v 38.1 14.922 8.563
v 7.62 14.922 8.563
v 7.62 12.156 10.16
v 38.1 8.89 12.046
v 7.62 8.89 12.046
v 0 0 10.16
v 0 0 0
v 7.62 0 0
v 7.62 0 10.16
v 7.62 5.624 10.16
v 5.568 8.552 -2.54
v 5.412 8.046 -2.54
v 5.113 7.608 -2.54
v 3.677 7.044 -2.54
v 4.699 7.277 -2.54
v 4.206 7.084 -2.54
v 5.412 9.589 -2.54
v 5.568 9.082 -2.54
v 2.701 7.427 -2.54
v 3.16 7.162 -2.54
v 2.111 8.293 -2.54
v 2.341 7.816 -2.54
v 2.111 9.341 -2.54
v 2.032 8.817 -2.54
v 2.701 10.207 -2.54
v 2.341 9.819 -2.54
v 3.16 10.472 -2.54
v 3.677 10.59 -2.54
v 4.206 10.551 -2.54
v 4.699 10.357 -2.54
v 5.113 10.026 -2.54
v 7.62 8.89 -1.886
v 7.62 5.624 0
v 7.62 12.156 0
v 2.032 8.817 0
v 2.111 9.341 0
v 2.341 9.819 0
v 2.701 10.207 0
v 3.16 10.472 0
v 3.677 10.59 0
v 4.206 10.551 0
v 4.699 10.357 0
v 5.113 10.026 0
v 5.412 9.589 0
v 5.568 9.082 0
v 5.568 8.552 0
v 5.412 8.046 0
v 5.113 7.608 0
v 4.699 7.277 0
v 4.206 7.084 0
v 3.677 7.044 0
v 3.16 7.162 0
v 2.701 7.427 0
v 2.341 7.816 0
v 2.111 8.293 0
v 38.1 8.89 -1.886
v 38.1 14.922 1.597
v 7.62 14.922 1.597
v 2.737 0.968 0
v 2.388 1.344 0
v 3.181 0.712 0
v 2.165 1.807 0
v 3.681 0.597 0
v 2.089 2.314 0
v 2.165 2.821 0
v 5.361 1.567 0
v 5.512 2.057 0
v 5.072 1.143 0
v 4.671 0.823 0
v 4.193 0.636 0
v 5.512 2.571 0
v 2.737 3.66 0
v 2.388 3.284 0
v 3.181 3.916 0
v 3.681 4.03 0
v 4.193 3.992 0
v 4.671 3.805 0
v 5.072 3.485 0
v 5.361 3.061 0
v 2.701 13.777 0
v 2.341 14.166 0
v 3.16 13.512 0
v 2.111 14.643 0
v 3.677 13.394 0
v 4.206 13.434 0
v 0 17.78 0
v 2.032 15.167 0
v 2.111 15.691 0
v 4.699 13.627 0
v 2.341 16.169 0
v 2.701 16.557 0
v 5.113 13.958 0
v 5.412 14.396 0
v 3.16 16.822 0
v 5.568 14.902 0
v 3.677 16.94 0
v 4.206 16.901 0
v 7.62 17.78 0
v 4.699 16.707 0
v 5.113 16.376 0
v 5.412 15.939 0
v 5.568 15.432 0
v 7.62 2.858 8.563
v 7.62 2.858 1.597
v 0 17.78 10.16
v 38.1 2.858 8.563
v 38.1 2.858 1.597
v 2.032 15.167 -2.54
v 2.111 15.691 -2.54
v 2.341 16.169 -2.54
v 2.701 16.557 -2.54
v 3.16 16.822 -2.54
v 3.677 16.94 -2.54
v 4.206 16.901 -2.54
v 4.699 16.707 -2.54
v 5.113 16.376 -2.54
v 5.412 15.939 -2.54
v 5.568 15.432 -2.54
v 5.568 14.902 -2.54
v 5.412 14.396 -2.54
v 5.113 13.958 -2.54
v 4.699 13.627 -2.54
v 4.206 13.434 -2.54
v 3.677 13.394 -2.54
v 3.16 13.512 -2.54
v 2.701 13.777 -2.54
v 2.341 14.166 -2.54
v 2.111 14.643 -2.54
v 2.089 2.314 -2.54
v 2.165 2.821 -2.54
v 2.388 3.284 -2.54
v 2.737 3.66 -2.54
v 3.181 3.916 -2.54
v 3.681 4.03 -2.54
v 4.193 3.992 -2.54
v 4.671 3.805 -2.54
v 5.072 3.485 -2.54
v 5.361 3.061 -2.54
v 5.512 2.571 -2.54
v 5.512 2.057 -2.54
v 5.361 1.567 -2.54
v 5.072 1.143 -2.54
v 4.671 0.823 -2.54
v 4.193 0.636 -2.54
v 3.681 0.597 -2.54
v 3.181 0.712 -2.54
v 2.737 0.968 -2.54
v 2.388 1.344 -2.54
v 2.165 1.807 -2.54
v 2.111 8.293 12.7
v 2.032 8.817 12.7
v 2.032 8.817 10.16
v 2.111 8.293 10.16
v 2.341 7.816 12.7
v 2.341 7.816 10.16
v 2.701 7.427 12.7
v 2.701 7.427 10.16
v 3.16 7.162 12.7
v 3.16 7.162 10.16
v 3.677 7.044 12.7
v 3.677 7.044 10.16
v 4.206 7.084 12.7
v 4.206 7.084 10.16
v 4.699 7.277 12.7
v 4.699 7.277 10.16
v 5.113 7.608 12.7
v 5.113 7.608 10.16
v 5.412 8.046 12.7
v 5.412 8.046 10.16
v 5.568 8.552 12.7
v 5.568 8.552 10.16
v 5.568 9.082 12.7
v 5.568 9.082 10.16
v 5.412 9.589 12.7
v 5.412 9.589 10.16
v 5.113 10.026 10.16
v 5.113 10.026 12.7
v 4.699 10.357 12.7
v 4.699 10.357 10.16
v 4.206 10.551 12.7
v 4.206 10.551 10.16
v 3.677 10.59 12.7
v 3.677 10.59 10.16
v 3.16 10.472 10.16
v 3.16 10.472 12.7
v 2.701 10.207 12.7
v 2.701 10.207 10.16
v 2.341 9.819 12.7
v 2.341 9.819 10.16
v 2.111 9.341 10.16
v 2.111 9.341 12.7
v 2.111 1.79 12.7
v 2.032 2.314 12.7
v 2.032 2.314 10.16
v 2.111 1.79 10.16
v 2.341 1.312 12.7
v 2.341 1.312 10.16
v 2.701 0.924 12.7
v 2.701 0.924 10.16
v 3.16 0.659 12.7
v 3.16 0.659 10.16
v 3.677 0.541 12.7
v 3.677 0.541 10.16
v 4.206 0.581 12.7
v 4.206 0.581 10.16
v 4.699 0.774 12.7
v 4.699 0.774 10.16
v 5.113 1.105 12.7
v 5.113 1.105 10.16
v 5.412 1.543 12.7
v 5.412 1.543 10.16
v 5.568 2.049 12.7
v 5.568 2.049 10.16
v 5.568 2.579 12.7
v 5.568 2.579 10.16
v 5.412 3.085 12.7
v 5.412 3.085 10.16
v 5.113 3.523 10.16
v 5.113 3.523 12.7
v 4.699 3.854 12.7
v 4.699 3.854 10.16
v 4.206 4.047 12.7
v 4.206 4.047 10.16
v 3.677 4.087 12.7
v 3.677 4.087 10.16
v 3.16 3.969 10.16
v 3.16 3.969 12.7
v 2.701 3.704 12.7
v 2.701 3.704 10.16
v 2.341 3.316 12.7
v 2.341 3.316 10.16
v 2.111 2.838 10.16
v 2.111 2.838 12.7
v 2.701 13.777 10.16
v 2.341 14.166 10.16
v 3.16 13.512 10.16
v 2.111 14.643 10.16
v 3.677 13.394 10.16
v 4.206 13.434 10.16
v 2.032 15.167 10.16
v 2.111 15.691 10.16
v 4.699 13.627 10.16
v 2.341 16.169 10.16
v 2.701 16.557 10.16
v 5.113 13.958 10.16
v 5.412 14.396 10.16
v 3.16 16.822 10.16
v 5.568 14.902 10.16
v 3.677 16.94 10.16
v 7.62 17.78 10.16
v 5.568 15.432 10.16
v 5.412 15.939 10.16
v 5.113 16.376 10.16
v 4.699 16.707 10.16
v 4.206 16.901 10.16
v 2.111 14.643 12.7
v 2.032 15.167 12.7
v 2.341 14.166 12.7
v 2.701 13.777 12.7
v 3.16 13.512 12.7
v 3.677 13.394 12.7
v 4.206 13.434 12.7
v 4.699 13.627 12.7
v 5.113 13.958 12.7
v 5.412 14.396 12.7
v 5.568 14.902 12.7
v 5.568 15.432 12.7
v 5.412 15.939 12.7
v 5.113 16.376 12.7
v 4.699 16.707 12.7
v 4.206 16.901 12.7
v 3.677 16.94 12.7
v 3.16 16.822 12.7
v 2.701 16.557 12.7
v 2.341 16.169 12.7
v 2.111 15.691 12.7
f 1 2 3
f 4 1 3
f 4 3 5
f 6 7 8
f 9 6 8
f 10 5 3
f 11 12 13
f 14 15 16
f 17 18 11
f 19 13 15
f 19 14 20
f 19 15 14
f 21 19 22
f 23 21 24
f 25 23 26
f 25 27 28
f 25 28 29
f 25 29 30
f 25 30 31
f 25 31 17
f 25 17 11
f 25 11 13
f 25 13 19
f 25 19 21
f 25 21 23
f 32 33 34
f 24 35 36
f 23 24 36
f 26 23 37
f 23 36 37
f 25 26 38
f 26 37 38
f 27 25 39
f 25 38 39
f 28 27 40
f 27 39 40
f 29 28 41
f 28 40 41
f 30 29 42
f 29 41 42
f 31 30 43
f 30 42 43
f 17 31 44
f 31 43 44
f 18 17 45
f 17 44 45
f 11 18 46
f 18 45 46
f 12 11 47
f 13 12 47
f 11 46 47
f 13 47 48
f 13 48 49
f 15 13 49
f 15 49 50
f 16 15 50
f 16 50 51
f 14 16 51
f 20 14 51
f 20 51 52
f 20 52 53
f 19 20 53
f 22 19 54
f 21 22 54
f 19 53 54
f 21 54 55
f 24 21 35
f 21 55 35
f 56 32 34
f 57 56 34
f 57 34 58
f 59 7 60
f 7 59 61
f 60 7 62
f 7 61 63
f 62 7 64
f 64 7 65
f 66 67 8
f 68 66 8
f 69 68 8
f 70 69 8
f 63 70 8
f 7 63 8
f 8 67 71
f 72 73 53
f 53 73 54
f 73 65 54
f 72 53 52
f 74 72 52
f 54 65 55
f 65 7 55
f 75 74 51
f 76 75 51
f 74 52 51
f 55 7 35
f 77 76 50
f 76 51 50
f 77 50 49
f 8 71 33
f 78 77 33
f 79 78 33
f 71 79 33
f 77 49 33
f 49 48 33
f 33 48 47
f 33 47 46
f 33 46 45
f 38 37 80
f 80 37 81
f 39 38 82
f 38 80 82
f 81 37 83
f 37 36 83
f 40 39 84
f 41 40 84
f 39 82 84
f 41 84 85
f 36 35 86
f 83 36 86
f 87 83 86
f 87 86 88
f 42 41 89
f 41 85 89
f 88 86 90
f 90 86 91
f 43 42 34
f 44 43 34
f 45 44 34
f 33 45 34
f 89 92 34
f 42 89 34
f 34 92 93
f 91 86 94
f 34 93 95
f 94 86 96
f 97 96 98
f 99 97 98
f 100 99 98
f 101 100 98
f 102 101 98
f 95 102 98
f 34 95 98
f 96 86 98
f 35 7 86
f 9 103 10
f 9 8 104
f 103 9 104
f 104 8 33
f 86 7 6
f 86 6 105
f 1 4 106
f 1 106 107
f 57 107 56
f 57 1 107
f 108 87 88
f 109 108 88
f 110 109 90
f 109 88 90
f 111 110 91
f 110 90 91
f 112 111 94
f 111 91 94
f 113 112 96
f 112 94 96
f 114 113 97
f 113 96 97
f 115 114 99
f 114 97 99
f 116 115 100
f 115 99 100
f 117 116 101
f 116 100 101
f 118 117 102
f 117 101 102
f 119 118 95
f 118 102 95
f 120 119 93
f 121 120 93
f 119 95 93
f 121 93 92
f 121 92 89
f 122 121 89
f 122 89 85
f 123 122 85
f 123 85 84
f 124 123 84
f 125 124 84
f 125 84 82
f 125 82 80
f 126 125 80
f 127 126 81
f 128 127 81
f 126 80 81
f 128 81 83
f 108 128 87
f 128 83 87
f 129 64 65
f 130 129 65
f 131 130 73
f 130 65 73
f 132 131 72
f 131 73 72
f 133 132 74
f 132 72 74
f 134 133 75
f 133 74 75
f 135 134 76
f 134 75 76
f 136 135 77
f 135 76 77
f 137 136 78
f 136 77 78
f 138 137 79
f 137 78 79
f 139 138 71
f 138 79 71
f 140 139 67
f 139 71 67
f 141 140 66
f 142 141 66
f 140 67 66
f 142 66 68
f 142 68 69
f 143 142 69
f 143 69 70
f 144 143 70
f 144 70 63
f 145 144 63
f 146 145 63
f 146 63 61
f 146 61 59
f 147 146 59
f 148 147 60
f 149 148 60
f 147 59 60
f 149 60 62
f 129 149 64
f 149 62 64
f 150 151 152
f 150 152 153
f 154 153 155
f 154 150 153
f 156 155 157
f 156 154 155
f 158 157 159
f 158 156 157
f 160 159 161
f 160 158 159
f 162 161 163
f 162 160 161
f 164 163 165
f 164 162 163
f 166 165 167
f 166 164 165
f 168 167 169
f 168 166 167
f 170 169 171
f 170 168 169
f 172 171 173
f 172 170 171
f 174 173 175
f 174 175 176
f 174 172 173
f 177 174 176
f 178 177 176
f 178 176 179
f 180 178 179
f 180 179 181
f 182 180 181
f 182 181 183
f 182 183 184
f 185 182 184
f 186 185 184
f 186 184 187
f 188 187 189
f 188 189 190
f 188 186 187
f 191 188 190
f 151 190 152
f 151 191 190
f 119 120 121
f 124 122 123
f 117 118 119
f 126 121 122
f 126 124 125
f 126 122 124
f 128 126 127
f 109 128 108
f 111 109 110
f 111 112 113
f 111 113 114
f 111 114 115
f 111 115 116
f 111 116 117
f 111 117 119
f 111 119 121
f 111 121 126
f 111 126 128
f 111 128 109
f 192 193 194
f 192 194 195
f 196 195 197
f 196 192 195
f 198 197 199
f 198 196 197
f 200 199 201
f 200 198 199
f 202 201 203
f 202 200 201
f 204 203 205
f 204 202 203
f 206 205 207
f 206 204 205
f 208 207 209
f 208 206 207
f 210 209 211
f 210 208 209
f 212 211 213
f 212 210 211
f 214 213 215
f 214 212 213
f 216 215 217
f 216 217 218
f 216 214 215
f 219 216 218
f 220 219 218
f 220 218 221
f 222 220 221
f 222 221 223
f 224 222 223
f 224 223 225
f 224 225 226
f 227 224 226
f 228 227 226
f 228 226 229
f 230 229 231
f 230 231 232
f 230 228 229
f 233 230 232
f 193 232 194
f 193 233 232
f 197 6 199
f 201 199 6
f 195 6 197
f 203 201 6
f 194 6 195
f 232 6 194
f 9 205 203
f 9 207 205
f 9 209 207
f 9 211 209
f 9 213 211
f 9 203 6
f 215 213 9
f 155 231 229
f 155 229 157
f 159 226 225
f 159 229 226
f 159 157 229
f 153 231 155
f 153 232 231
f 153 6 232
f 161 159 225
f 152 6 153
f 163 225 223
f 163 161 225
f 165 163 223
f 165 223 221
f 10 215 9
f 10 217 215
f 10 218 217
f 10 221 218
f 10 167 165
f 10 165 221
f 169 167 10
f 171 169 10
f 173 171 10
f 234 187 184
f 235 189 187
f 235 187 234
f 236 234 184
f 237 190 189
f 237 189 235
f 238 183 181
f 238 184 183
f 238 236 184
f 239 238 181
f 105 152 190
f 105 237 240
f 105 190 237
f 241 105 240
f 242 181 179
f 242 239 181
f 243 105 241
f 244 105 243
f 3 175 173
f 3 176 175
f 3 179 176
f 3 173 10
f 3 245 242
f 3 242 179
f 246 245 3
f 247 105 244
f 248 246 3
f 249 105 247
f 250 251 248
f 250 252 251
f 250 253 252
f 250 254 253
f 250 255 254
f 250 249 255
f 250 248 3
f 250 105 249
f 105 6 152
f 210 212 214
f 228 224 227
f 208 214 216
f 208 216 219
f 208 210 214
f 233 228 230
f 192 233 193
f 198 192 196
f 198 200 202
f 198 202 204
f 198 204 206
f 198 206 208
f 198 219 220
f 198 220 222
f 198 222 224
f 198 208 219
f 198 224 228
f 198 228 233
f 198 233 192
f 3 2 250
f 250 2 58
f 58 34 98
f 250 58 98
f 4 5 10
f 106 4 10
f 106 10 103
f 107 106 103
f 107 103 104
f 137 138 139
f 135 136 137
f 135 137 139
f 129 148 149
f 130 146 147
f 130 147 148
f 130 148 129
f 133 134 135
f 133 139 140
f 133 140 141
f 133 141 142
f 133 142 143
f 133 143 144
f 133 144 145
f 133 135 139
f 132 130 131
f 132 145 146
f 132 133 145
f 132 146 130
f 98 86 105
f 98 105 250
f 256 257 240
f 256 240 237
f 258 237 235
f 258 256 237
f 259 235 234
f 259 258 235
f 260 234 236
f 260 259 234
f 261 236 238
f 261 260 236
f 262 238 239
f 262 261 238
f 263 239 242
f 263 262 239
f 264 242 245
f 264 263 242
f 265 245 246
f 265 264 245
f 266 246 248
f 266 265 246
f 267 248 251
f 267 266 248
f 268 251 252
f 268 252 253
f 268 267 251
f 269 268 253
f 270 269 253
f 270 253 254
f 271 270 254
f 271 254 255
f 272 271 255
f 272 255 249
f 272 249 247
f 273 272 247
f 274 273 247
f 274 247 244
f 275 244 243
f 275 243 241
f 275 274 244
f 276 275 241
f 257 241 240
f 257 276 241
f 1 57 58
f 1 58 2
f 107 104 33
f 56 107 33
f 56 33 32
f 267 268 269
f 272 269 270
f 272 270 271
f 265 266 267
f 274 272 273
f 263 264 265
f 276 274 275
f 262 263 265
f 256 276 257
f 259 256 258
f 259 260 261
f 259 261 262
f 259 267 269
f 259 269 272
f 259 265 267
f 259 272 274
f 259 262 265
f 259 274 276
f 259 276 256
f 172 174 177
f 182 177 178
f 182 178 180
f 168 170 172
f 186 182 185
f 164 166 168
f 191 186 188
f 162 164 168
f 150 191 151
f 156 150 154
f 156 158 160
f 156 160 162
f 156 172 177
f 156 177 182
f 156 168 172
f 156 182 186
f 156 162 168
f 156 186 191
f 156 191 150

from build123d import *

# Parameters (mm, degrees)
SKETCH2_W           = 7.62
SKETCH2_H           = 17.78
BOSS_EXTRUDE1_DEPTH = 10.16
BOSS_EXTRUDE3_DEPTH = 30.48
SKETCH8_R           = 1.778
SKETCH8_R_2         = 1.721357936
BOSS_EXTRUDE4_DEPTH = 2.54
BOSS_EXTRUDE5_START = 2.54
SKETCH6_R           = 1.778
BOSS_EXTRUDE5_DEPTH = 2.54


with BuildPart() as part:
    # Sketch2 → Boss-Extrude1 (new body)
    with BuildSketch(Plane.XY):
        with Locations((3.81, 8.89)):
            Rectangle(SKETCH2_W, SKETCH2_H)
    extrude(amount=BOSS_EXTRUDE1_DEPTH)

    # Sketch3 → Boss-Extrude3 (add)
    with BuildSketch(Plane(origin=(7.62, 0, 0), x_dir=(0, 0, -1), z_dir=(1, 0, 0))):
        Polygon((1.885696, 8.89), (-1.597152, 14.922469691), (-8.562848, 14.922469691), (-12.045696, 8.89), (-8.562848, 2.857530309), (-1.597152, 2.857530309), align=None)
    extrude(amount=BOSS_EXTRUDE3_DEPTH)

    # Sketch8 → Boss-Extrude4 (add)
    with BuildSketch(Plane(origin=(0, 0, 0), x_dir=(-1, 0, 0), z_dir=(0, 0, -1))):
        with Locations((-3.81, 15.167140335)):
            Circle(SKETCH8_R)
        with Locations((-3.81, 8.817140335)):
            Circle(SKETCH8_R)
        with Locations((-3.81, 2.31394822)):
            Circle(SKETCH8_R_2)
    extrude(amount=BOSS_EXTRUDE4_DEPTH)

    # Sketch6 → Boss-Extrude5 (add)
    with BuildSketch(Plane.XY.offset(10.16).offset(BOSS_EXTRUDE5_START)):
        with Locations(Location((3.81, 15.167140335, 0), (0, 0, 180))):
            Circle(SKETCH6_R)
        with Locations(Location((3.81, 8.817140335, 0), (0, 0, 180))):
            Circle(SKETCH6_R)
        with Locations(Location((3.81, 2.31394822, 0), (0, 0, 180))):
            Circle(SKETCH6_R)
    extrude(amount=-BOSS_EXTRUDE5_DEPTH)


solid = part.part
